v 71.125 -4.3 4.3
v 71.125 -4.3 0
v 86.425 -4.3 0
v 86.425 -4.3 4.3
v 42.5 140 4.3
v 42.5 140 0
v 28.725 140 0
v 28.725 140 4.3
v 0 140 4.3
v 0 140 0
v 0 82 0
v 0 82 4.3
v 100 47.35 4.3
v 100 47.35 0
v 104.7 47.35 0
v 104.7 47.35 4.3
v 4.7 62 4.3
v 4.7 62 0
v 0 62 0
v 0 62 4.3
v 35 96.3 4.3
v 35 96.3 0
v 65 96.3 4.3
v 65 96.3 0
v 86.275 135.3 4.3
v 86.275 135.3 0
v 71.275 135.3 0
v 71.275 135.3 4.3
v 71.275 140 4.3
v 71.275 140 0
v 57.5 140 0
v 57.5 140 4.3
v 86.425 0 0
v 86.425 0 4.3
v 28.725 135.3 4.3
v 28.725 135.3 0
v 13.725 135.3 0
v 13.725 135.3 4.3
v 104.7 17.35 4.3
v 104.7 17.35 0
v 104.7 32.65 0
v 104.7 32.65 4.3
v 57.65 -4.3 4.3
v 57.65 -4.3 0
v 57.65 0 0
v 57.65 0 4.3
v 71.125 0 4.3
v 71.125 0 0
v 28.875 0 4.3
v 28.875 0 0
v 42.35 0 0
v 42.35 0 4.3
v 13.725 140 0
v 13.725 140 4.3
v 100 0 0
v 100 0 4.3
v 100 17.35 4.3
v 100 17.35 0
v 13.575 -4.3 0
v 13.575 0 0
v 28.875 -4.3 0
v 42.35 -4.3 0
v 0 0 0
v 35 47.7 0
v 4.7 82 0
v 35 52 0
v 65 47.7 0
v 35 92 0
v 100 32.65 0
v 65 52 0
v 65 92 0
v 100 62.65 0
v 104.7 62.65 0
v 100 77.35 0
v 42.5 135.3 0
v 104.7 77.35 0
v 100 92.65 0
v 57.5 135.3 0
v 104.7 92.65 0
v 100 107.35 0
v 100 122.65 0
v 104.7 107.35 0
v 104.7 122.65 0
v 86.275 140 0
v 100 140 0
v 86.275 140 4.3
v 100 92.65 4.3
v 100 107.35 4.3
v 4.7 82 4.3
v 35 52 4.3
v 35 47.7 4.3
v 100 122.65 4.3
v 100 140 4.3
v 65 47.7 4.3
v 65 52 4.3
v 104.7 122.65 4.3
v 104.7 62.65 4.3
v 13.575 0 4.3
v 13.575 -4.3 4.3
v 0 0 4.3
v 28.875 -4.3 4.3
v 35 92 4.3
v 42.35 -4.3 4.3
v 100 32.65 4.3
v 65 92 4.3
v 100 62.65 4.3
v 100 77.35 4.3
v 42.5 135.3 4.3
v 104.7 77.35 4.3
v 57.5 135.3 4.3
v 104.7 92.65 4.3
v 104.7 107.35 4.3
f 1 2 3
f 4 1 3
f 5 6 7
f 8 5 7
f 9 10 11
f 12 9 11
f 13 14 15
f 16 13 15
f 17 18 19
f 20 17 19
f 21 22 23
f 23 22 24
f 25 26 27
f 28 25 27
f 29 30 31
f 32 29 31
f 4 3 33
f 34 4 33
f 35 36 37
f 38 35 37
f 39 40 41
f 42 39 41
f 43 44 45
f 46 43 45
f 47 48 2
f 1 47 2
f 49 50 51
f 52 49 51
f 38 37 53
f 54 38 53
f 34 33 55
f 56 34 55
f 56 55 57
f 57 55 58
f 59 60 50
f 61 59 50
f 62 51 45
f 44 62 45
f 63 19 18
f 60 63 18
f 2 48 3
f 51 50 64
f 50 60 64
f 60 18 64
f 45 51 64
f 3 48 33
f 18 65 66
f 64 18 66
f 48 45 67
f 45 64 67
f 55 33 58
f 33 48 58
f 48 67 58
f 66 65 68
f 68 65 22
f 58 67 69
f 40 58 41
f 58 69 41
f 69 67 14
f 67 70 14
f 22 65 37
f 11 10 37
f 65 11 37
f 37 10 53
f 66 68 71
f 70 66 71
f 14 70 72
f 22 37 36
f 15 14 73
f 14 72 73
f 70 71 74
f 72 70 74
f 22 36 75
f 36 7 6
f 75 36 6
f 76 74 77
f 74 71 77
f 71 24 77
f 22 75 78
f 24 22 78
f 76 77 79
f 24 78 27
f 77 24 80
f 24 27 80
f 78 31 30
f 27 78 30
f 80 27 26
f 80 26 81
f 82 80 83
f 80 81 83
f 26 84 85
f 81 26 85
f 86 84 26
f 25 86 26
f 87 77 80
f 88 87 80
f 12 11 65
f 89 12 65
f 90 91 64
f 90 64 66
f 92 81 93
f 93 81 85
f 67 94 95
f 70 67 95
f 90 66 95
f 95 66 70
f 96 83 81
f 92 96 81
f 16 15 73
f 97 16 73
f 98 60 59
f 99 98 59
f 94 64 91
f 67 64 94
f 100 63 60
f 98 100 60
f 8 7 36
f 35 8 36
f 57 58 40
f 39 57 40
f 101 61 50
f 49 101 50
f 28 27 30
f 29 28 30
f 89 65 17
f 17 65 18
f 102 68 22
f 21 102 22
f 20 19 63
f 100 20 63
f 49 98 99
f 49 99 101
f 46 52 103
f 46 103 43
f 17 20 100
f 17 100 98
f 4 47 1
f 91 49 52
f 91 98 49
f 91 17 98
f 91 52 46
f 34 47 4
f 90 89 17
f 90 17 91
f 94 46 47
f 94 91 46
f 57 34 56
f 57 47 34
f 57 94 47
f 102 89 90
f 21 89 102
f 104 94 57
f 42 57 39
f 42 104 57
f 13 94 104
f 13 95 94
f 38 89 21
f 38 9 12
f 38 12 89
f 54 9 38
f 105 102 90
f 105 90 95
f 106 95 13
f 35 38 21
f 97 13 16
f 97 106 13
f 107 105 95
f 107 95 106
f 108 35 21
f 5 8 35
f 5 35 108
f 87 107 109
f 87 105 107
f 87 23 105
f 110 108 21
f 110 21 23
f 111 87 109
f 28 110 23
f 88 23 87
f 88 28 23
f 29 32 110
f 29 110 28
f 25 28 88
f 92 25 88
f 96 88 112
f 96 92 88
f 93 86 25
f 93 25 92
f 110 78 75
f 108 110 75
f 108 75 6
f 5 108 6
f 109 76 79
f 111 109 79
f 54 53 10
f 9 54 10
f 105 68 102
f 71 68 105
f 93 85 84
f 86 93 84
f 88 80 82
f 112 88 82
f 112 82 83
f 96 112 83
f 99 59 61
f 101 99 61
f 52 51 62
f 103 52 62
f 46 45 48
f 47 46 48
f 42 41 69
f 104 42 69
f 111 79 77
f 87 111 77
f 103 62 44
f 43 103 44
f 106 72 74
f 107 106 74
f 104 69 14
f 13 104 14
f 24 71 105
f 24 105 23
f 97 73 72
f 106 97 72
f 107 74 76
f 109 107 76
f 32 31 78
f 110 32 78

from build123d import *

# Parameters (mm, degrees)
SKETCH2_W           = 30
SKETCH2_H           = 4.3
BOSS_EXTRUDE1_DEPTH = 4.3


with BuildPart() as part:
    # Sketch2 → Boss-Extrude1 (new body)
    with BuildSketch(Plane.XY):
        Polygon((100, 0), (100, 17.35), (104.7, 17.35), (104.7, 32.65), (100, 32.65), (100, 47.35), (104.7, 47.35), (104.7, 62.65), (100, 62.65), (100, 77.35), (104.7, 77.35), (104.7, 92.65), (100, 92.65), (100, 107.35), (104.7, 107.35), (104.7, 122.65), (100, 122.65), (100, 140), (86.275, 140), (86.275, 135.3), (71.275, 135.3), (71.275, 140), (57.5, 140), (57.5, 135.3), (42.5, 135.3), (42.5, 140), (28.725, 140), (28.725, 135.3), (13.725, 135.3), (13.725, 140), (0, 140), (0, 82), (4.7, 82), (4.7, 62), (0, 62), (0, 0), (13.575, 0), (13.575, -4.3), (28.875, -4.3), (28.875, 0), (42.35, 0), (42.35, -4.3), (57.65, -4.3), (57.65, 0), (71.125, 0), (71.125, -4.3), (86.425, -4.3), (86.425, 0), align=None)
        with Locations((50, 49.85)):
            Rectangle(SKETCH2_W, SKETCH2_H, mode=Mode.SUBTRACT)
        with Locations((50, 94.15)):
            Rectangle(SKETCH2_W, SKETCH2_H, mode=Mode.SUBTRACT)
    extrude(amount=BOSS_EXTRUDE1_DEPTH)


solid = part.part
